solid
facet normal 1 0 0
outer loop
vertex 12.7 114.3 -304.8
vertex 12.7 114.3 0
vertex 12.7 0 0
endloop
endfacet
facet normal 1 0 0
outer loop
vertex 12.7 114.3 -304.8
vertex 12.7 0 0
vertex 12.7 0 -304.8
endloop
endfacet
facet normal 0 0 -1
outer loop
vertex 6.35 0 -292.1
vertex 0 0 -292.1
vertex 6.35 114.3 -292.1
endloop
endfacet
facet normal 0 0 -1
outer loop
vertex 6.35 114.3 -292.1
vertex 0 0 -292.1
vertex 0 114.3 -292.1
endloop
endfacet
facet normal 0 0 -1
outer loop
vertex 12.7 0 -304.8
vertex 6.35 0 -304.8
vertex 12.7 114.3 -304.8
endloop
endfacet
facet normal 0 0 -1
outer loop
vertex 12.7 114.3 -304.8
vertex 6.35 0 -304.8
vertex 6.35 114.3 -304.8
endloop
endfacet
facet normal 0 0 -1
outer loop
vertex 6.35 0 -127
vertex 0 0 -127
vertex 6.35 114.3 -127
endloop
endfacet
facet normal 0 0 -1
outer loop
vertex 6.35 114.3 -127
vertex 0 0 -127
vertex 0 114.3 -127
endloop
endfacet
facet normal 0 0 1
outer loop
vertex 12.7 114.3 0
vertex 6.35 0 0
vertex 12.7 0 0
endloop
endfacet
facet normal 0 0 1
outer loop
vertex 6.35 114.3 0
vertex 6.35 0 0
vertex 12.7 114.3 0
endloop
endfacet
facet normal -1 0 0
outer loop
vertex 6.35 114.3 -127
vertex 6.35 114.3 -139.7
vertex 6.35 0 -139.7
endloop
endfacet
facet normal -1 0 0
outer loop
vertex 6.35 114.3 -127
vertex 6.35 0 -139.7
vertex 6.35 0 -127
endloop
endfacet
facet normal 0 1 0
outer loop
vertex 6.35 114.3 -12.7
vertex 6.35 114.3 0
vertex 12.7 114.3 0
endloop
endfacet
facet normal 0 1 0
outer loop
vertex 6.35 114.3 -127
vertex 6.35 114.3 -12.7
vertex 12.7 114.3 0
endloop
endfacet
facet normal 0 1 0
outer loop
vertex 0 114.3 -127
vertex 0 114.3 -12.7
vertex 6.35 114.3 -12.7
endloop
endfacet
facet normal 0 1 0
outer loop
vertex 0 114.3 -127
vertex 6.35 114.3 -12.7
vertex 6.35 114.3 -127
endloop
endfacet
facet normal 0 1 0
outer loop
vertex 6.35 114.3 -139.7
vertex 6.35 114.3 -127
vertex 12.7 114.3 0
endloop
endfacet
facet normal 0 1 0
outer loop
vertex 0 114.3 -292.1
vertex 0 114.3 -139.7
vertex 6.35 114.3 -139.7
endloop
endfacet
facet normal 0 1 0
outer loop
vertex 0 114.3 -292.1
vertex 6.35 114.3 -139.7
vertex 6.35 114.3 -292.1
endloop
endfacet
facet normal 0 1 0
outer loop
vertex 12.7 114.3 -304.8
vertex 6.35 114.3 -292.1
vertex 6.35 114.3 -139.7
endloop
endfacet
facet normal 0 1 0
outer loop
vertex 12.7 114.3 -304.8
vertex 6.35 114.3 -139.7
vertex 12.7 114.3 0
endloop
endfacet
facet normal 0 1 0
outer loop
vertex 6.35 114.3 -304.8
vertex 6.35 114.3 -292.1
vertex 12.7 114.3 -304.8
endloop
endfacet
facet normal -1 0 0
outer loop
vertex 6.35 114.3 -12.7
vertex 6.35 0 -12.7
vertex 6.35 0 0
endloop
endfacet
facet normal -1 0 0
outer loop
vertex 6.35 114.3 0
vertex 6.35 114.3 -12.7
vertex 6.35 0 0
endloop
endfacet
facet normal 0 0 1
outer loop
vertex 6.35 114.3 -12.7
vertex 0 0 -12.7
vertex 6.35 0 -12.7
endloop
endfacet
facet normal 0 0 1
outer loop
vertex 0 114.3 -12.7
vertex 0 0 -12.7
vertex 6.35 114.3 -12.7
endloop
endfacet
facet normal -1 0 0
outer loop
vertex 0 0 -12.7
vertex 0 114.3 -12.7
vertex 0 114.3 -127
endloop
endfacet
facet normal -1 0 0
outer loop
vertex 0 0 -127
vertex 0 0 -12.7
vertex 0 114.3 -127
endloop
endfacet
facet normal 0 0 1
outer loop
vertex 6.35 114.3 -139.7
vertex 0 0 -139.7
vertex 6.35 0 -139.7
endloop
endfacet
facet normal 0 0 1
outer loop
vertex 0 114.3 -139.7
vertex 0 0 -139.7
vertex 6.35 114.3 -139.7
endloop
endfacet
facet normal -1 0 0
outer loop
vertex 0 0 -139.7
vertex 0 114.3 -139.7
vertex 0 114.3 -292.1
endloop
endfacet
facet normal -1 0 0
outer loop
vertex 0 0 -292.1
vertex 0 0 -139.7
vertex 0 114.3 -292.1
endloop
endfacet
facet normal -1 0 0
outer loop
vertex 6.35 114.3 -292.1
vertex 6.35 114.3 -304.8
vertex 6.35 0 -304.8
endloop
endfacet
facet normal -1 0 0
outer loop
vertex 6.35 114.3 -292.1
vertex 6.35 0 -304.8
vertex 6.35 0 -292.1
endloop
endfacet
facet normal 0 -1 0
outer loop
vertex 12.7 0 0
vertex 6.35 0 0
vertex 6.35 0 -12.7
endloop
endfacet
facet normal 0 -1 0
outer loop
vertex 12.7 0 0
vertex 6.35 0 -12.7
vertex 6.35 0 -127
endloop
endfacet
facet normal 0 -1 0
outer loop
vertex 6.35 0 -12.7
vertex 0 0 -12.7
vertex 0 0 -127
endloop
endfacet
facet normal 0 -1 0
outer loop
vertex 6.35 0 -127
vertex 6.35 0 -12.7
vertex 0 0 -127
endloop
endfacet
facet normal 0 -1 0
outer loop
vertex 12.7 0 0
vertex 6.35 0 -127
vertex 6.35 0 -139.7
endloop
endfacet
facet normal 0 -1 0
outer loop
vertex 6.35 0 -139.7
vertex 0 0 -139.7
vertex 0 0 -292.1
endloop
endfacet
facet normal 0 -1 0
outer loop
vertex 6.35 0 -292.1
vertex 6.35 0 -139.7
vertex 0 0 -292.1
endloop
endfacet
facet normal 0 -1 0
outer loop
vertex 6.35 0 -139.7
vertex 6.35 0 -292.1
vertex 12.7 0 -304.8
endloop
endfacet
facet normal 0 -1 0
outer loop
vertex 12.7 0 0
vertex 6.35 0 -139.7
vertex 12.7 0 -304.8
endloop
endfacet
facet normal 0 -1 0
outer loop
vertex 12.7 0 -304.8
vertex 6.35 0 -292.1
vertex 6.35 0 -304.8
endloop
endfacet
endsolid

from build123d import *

# Parameters (mm, degrees)
SKETCH1_W           = 304.8
SKETCH1_H           = 114.3
BOSS_EXTRUDE1_DEPTH = 12.7
SKETCH2_W           = 12.7
SKETCH2_H           = 114.3
CUT_EXTRUDE1_DEPTH  = 6.35


with BuildPart() as part:
    # Sketch1 → Boss-Extrude1 (new body)
    with BuildSketch(Plane(origin=(0, 0, 0), x_dir=(0, 0, -1), z_dir=(1, 0, 0))):
        with Locations((152.4, 57.15)):
            Rectangle(SKETCH1_W, SKETCH1_H)
    extrude(amount=BOSS_EXTRUDE1_DEPTH)

    # Sketch2 → Cut-Extrude1 (cut)
    with BuildSketch(Plane.ZY):
        with Locations((-6.35, 57.15)):
            Rectangle(SKETCH2_W, SKETCH2_H)
        with Locations((-298.45, 57.15)):
            Rectangle(SKETCH2_W, SKETCH2_H)
        with Locations((-133.35, 57.15)):
            Rectangle(SKETCH2_W, SKETCH2_H)
    extrude(amount=-CUT_EXTRUDE1_DEPTH, mode=Mode.SUBTRACT)


solid = part.part
